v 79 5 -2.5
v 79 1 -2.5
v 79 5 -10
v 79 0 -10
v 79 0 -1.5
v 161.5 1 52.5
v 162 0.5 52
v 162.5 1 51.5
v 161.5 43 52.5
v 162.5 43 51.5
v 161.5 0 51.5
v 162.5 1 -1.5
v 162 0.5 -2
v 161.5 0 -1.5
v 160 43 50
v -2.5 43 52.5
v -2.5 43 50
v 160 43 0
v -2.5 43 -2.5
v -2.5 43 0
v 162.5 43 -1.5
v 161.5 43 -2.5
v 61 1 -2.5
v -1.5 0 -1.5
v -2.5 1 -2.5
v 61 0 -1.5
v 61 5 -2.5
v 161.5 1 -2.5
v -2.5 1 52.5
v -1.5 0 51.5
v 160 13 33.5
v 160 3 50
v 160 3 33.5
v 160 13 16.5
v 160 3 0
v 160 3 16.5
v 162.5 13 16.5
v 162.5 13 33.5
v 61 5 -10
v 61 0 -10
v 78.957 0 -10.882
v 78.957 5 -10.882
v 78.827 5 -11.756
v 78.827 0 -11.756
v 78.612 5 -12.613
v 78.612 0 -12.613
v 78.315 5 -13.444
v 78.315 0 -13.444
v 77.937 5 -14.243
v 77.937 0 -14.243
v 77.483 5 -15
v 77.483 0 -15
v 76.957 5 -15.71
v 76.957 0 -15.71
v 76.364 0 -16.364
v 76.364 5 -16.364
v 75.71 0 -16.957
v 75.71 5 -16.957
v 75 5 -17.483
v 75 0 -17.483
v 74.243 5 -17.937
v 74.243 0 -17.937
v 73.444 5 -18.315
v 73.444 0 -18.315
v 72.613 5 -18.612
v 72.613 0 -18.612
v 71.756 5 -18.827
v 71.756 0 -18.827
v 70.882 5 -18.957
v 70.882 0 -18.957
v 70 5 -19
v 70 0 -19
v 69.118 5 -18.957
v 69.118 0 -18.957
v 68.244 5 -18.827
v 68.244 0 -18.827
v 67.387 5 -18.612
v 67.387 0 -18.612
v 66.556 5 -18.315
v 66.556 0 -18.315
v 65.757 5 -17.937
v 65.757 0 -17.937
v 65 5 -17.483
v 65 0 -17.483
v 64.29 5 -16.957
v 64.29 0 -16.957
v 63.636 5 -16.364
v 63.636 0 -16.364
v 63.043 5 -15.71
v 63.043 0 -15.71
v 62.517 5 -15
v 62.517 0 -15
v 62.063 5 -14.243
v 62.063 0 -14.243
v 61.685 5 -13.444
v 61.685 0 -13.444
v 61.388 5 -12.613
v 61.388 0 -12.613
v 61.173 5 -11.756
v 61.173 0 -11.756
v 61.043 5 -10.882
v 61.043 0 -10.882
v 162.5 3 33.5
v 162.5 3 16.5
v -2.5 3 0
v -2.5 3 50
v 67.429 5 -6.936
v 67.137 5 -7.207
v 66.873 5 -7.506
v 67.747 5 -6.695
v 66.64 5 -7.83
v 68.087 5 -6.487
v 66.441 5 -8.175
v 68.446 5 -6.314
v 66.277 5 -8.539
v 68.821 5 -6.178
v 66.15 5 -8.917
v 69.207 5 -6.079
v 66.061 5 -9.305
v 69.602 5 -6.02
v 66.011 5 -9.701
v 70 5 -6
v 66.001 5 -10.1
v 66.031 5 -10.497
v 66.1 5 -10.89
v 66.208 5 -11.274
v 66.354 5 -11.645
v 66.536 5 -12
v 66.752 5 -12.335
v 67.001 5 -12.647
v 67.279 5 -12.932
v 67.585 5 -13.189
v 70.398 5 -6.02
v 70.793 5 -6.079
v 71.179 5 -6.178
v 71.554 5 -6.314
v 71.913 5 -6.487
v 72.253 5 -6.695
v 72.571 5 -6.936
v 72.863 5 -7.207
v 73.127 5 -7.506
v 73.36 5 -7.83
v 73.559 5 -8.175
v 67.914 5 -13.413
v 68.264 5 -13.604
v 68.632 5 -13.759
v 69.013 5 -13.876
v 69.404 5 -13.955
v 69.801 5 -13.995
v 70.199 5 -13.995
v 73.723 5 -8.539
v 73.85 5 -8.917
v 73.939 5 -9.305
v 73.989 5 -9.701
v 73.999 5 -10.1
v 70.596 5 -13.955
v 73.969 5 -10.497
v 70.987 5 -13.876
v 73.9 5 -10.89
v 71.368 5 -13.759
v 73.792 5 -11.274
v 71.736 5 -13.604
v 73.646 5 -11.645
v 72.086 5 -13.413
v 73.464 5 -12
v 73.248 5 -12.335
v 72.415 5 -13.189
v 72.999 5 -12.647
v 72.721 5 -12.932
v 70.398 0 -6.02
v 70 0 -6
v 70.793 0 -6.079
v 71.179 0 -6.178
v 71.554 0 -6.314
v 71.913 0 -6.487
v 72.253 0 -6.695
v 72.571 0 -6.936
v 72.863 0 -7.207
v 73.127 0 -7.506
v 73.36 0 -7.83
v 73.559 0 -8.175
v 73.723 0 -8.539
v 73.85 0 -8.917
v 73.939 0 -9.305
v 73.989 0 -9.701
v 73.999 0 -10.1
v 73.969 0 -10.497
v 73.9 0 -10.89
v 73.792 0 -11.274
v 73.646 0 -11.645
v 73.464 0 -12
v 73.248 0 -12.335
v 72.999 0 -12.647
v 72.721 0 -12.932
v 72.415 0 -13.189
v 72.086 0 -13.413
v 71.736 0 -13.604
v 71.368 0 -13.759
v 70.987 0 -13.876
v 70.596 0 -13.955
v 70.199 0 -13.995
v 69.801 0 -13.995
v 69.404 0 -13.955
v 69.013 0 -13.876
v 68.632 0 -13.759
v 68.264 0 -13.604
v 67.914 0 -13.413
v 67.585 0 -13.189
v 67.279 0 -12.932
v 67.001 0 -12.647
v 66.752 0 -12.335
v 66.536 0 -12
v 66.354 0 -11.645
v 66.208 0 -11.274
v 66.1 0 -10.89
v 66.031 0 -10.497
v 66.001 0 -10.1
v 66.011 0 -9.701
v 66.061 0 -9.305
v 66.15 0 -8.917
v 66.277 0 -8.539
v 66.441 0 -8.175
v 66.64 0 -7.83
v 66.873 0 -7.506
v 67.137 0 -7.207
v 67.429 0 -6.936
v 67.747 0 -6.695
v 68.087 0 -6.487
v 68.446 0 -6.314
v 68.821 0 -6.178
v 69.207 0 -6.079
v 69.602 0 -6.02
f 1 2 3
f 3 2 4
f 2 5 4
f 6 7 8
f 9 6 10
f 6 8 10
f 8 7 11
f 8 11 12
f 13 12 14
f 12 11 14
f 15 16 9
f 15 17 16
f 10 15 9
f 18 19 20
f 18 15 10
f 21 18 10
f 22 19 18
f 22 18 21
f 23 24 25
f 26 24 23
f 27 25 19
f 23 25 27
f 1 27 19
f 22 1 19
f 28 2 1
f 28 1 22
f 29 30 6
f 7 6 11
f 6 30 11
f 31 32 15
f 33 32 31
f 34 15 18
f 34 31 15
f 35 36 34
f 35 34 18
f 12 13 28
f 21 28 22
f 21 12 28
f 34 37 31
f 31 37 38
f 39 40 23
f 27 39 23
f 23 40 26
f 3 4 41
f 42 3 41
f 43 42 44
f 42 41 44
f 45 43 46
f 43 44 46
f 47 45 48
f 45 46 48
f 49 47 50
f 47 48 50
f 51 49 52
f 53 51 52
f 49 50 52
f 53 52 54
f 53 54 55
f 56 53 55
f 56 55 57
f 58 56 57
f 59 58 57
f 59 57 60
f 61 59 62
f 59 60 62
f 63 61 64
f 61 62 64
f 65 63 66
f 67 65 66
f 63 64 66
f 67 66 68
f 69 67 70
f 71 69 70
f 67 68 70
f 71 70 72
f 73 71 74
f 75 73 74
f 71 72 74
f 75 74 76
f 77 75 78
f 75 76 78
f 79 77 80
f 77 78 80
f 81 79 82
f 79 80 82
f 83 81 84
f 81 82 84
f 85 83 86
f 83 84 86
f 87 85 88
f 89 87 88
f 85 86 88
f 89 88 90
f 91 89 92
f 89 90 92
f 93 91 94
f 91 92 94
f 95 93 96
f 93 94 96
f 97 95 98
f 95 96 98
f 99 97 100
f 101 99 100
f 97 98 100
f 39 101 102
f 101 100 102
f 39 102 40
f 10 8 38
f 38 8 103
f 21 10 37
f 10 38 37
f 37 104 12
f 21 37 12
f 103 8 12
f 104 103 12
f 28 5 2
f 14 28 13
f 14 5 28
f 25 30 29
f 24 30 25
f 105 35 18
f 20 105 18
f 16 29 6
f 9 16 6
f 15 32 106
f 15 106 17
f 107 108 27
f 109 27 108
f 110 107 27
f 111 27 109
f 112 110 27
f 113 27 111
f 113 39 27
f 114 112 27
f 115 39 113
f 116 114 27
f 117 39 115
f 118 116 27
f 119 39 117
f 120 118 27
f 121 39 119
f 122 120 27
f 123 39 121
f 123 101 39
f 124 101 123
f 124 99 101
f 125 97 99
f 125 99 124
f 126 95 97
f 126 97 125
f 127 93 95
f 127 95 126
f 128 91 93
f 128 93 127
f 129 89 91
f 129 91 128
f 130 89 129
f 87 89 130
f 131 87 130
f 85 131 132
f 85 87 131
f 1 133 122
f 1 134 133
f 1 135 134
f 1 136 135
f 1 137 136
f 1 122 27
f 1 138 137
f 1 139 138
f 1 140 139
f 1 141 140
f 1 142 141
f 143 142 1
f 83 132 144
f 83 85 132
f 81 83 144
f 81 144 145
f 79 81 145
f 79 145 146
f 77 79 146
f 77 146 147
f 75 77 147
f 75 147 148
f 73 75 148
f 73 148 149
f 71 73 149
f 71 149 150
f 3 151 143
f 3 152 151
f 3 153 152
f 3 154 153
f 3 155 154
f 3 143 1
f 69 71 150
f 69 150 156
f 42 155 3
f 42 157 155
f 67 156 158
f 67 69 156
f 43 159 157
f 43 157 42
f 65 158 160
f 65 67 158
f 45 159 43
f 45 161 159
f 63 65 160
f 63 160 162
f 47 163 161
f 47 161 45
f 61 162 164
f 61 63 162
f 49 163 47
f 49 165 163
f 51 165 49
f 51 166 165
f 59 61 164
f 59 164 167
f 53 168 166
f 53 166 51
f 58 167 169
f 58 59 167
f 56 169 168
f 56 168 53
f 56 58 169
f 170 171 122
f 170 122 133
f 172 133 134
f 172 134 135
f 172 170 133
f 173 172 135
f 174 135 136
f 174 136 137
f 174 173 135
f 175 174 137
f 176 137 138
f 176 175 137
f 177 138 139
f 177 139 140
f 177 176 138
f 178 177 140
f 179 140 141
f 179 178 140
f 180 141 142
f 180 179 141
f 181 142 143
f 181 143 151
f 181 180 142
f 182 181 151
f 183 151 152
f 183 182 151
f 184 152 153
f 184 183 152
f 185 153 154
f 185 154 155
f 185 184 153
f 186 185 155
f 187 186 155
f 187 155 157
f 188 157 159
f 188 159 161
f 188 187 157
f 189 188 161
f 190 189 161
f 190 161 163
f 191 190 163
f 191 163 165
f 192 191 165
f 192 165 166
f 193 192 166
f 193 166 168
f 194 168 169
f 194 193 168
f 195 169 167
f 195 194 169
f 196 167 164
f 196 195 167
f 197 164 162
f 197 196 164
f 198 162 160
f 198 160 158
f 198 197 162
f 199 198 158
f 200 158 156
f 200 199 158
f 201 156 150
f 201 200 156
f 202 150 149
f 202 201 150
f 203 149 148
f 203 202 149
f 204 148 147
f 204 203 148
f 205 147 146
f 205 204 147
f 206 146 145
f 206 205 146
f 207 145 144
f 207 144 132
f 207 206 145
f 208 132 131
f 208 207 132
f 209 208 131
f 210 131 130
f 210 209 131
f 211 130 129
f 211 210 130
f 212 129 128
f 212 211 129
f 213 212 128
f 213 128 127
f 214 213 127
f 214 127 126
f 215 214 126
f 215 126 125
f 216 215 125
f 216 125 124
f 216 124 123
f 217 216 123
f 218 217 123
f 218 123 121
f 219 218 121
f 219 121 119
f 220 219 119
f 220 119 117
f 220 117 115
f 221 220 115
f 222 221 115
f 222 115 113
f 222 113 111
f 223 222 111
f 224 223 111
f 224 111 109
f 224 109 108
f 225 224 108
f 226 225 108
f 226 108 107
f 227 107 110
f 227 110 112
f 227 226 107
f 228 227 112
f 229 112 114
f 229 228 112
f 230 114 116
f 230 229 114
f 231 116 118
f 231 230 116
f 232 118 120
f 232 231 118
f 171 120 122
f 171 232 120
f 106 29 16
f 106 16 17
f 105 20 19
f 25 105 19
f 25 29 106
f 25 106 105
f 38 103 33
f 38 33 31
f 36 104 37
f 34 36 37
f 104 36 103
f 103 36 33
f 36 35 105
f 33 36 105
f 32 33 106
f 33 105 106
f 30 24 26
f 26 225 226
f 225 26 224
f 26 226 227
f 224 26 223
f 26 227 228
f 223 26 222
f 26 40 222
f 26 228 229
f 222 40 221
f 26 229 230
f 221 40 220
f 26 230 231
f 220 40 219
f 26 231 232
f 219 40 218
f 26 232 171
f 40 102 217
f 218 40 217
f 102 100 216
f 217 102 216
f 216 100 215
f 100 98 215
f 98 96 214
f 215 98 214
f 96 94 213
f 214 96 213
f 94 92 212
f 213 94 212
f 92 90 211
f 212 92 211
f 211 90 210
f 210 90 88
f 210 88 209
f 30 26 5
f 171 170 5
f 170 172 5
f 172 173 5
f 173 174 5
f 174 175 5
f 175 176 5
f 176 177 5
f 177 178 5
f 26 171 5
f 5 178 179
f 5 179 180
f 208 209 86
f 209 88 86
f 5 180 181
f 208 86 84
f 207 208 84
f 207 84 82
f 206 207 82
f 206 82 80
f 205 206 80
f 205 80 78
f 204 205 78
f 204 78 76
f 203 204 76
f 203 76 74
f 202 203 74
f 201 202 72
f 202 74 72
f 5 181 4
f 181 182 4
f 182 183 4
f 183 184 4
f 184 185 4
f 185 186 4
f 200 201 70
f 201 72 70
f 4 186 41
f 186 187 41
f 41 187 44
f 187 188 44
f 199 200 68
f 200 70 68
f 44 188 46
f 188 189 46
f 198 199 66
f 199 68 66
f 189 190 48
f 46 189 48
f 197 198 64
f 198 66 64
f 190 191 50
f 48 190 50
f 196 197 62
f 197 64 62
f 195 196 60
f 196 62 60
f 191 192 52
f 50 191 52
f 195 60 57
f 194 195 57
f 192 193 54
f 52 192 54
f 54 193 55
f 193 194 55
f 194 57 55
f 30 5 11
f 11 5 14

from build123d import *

# Parameters (mm, degrees)
SKETCH_1_W             = 160
SKETCH_1_H             = 50
EXTRUDE_1_DEPTH        = 3
EXTRUDE_1_2_DEPTH      = 40
EXTRUDE_1_2_DEPTH_BACK = 3
SKETCH_3_W             = 165
SKETCH_3_H             = 55
SKETCH_3_W_2           = 160
SKETCH_3_H_2           = 50
SKETCH_4_W             = 50
SKETCH_4_H             = 40
CUT_EXTRUDE_1_DEPTH    = 100
CHAMFER_1_SIZE         = 1
CHAMFER_2_SIZE         = 1
SKETCH_1_4_R           = 4
EXTRUDE_8_DEPTH        = 5
SKETCH_8_W             = 8.5
SKETCH_8_H             = 10
CUT_EXTRUDE_3_DEPTH    = 10


with BuildPart() as part:
    # 草图1 → Extrude 1 (new body)
    with BuildSketch(Plane(origin=(0, 0, 0), x_dir=(1, 0, 0), z_dir=(0, 1, 0))):
        with Locations((80, -25)):
            Rectangle(SKETCH_1_W, SKETCH_1_H)
    extrude(amount=EXTRUDE_1_DEPTH)



with BuildPart() as body_2:
    # 草图3 → Extrude 1 2 (new, two sides: drawn at the far end of the back side and taken through both)
    with BuildSketch(Plane(origin=(0, 3, 0), x_dir=(1, 0, 0), z_dir=(0, 1, 0)).offset(-EXTRUDE_1_2_DEPTH_BACK)):
        with Locations((80, -25)):
            Rectangle(SKETCH_3_W, SKETCH_3_H)
        with Locations((80, -25)):
            Rectangle(SKETCH_3_W_2, SKETCH_3_H_2, mode=Mode.SUBTRACT)
    extrude(amount=EXTRUDE_1_2_DEPTH + EXTRUDE_1_2_DEPTH_BACK)

    # 草图4 → 切除-拉伸1 (cut)
    with BuildSketch(Plane.ZY.offset(2.5)):
        with Locations((25, 23)):
            Rectangle(SKETCH_4_W, SKETCH_4_H)
    extrude(amount=-CUT_EXTRUDE_1_DEPTH, mode=Mode.SUBTRACT)

    # 倒角1
    chamfer_1_edges = [body_2.edges().sort_by_distance(p)[0] for p in [
        (162.5, 0, 25),
        (80, 0, -2.5),
        (-2.5, 0, 25),
        (80, 0, 52.5),
    ]]
    chamfer(chamfer_1_edges, length=CHAMFER_1_SIZE)

    # 倒角2
    chamfer_2_edges = [body_2.edges().sort_by_distance(p)[0] for p in [
        (162.5, 22, -2.5),
        (162.5, 22, 52.5),
    ]]
    chamfer(chamfer_2_edges, length=CHAMFER_2_SIZE)


with BuildPart() as part_1:
    add(part.part)

    add(body_2.part)  # 凸台-拉伸8 merges body 2
    # 草图1<4> → 凸台-拉伸8 (add)
    with BuildSketch(Plane(origin=(0, 0, 0), x_dir=(1, 0, 0), z_dir=(0, 1, 0))):
        with BuildLine():
            Line((61, 10), (61, 0))
            Line((61, 0), (70, 0))
            Line((70, 0), (79, 0))
            Line((79, 0), (79, 10))
            ThreePointArc((79, 10), (70, 19), (61, 10))
        make_face()
        with Locations(Location((70, 10, 0), (0, 0, 270))):
            Circle(SKETCH_1_4_R, mode=Mode.SUBTRACT)
    extrude(amount=EXTRUDE_8_DEPTH)

    # 草图8 → 切除-拉伸3 (cut)
    with BuildSketch(Plane(origin=(162.5, 0, 0), x_dir=(0, 0, -1), z_dir=(1, 0, 0))):
        with Locations((-20.75, 8)):
            Rectangle(SKETCH_8_W, SKETCH_8_H)
        with Locations((-29.25, 8)):
            Rectangle(SKETCH_8_W, SKETCH_8_H)
    extrude(amount=-CUT_EXTRUDE_3_DEPTH, mode=Mode.SUBTRACT)


solid = part_1.part
